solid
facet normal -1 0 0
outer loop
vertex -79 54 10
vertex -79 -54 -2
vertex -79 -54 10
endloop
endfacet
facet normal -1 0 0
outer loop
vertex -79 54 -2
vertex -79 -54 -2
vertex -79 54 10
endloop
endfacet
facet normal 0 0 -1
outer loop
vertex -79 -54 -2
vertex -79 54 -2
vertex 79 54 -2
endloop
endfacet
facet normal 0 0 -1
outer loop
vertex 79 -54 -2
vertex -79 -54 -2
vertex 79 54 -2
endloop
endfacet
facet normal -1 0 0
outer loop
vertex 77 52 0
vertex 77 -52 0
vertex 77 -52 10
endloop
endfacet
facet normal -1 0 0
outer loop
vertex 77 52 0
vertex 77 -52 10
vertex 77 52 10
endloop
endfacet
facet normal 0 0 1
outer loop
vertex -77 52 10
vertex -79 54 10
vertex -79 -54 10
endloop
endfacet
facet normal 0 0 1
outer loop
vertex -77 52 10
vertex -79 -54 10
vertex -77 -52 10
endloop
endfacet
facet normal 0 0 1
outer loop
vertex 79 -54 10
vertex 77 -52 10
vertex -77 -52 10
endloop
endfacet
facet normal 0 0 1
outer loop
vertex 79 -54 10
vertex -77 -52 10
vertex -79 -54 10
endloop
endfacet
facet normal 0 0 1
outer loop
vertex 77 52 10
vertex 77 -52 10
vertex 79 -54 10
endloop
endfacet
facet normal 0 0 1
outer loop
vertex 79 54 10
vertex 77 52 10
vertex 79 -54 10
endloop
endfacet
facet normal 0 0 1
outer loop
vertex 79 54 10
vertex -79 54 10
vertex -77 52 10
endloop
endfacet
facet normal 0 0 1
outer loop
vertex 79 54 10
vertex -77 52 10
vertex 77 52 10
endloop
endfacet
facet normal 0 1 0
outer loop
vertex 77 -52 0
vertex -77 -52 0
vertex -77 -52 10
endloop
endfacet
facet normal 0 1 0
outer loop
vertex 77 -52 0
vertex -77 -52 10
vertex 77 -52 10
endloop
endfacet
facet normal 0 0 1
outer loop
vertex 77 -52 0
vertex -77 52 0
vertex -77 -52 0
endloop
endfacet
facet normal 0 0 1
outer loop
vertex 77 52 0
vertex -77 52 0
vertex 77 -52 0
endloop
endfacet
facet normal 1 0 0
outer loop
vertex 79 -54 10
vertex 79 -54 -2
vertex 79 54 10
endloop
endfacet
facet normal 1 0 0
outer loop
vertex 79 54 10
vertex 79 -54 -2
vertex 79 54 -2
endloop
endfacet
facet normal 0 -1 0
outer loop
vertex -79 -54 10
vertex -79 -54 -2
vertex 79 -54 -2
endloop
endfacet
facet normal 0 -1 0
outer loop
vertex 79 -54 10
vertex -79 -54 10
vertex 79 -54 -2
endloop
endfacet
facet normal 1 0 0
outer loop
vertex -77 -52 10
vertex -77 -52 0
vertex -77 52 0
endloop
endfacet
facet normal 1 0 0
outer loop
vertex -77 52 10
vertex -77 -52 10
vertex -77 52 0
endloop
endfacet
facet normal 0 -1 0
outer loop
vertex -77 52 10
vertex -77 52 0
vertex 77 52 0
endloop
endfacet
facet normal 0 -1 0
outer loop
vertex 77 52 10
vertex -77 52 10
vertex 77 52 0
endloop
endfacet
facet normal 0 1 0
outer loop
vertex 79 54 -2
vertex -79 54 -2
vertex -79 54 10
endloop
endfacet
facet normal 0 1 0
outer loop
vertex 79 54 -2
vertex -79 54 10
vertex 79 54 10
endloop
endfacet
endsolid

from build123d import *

# Parameters (mm, degrees)
F0_W     = 154
F0_H     = 104
F1_DEPTH = 10
F2_T     = 2


with BuildPart() as f1:
    # F0 (on Top) → F1 (new body)
    with BuildSketch(Plane.XY):
        Rectangle(F0_W, F0_H)
    extrude(amount=F1_DEPTH)

    # F2
    f2_openings = [f1.faces().sort_by_distance(p)[0] for p in [
        (0, 0, 10),
    ]]
    offset(amount=F2_T, openings=f2_openings, kind=Kind.INTERSECTION)


solid = f1.part
